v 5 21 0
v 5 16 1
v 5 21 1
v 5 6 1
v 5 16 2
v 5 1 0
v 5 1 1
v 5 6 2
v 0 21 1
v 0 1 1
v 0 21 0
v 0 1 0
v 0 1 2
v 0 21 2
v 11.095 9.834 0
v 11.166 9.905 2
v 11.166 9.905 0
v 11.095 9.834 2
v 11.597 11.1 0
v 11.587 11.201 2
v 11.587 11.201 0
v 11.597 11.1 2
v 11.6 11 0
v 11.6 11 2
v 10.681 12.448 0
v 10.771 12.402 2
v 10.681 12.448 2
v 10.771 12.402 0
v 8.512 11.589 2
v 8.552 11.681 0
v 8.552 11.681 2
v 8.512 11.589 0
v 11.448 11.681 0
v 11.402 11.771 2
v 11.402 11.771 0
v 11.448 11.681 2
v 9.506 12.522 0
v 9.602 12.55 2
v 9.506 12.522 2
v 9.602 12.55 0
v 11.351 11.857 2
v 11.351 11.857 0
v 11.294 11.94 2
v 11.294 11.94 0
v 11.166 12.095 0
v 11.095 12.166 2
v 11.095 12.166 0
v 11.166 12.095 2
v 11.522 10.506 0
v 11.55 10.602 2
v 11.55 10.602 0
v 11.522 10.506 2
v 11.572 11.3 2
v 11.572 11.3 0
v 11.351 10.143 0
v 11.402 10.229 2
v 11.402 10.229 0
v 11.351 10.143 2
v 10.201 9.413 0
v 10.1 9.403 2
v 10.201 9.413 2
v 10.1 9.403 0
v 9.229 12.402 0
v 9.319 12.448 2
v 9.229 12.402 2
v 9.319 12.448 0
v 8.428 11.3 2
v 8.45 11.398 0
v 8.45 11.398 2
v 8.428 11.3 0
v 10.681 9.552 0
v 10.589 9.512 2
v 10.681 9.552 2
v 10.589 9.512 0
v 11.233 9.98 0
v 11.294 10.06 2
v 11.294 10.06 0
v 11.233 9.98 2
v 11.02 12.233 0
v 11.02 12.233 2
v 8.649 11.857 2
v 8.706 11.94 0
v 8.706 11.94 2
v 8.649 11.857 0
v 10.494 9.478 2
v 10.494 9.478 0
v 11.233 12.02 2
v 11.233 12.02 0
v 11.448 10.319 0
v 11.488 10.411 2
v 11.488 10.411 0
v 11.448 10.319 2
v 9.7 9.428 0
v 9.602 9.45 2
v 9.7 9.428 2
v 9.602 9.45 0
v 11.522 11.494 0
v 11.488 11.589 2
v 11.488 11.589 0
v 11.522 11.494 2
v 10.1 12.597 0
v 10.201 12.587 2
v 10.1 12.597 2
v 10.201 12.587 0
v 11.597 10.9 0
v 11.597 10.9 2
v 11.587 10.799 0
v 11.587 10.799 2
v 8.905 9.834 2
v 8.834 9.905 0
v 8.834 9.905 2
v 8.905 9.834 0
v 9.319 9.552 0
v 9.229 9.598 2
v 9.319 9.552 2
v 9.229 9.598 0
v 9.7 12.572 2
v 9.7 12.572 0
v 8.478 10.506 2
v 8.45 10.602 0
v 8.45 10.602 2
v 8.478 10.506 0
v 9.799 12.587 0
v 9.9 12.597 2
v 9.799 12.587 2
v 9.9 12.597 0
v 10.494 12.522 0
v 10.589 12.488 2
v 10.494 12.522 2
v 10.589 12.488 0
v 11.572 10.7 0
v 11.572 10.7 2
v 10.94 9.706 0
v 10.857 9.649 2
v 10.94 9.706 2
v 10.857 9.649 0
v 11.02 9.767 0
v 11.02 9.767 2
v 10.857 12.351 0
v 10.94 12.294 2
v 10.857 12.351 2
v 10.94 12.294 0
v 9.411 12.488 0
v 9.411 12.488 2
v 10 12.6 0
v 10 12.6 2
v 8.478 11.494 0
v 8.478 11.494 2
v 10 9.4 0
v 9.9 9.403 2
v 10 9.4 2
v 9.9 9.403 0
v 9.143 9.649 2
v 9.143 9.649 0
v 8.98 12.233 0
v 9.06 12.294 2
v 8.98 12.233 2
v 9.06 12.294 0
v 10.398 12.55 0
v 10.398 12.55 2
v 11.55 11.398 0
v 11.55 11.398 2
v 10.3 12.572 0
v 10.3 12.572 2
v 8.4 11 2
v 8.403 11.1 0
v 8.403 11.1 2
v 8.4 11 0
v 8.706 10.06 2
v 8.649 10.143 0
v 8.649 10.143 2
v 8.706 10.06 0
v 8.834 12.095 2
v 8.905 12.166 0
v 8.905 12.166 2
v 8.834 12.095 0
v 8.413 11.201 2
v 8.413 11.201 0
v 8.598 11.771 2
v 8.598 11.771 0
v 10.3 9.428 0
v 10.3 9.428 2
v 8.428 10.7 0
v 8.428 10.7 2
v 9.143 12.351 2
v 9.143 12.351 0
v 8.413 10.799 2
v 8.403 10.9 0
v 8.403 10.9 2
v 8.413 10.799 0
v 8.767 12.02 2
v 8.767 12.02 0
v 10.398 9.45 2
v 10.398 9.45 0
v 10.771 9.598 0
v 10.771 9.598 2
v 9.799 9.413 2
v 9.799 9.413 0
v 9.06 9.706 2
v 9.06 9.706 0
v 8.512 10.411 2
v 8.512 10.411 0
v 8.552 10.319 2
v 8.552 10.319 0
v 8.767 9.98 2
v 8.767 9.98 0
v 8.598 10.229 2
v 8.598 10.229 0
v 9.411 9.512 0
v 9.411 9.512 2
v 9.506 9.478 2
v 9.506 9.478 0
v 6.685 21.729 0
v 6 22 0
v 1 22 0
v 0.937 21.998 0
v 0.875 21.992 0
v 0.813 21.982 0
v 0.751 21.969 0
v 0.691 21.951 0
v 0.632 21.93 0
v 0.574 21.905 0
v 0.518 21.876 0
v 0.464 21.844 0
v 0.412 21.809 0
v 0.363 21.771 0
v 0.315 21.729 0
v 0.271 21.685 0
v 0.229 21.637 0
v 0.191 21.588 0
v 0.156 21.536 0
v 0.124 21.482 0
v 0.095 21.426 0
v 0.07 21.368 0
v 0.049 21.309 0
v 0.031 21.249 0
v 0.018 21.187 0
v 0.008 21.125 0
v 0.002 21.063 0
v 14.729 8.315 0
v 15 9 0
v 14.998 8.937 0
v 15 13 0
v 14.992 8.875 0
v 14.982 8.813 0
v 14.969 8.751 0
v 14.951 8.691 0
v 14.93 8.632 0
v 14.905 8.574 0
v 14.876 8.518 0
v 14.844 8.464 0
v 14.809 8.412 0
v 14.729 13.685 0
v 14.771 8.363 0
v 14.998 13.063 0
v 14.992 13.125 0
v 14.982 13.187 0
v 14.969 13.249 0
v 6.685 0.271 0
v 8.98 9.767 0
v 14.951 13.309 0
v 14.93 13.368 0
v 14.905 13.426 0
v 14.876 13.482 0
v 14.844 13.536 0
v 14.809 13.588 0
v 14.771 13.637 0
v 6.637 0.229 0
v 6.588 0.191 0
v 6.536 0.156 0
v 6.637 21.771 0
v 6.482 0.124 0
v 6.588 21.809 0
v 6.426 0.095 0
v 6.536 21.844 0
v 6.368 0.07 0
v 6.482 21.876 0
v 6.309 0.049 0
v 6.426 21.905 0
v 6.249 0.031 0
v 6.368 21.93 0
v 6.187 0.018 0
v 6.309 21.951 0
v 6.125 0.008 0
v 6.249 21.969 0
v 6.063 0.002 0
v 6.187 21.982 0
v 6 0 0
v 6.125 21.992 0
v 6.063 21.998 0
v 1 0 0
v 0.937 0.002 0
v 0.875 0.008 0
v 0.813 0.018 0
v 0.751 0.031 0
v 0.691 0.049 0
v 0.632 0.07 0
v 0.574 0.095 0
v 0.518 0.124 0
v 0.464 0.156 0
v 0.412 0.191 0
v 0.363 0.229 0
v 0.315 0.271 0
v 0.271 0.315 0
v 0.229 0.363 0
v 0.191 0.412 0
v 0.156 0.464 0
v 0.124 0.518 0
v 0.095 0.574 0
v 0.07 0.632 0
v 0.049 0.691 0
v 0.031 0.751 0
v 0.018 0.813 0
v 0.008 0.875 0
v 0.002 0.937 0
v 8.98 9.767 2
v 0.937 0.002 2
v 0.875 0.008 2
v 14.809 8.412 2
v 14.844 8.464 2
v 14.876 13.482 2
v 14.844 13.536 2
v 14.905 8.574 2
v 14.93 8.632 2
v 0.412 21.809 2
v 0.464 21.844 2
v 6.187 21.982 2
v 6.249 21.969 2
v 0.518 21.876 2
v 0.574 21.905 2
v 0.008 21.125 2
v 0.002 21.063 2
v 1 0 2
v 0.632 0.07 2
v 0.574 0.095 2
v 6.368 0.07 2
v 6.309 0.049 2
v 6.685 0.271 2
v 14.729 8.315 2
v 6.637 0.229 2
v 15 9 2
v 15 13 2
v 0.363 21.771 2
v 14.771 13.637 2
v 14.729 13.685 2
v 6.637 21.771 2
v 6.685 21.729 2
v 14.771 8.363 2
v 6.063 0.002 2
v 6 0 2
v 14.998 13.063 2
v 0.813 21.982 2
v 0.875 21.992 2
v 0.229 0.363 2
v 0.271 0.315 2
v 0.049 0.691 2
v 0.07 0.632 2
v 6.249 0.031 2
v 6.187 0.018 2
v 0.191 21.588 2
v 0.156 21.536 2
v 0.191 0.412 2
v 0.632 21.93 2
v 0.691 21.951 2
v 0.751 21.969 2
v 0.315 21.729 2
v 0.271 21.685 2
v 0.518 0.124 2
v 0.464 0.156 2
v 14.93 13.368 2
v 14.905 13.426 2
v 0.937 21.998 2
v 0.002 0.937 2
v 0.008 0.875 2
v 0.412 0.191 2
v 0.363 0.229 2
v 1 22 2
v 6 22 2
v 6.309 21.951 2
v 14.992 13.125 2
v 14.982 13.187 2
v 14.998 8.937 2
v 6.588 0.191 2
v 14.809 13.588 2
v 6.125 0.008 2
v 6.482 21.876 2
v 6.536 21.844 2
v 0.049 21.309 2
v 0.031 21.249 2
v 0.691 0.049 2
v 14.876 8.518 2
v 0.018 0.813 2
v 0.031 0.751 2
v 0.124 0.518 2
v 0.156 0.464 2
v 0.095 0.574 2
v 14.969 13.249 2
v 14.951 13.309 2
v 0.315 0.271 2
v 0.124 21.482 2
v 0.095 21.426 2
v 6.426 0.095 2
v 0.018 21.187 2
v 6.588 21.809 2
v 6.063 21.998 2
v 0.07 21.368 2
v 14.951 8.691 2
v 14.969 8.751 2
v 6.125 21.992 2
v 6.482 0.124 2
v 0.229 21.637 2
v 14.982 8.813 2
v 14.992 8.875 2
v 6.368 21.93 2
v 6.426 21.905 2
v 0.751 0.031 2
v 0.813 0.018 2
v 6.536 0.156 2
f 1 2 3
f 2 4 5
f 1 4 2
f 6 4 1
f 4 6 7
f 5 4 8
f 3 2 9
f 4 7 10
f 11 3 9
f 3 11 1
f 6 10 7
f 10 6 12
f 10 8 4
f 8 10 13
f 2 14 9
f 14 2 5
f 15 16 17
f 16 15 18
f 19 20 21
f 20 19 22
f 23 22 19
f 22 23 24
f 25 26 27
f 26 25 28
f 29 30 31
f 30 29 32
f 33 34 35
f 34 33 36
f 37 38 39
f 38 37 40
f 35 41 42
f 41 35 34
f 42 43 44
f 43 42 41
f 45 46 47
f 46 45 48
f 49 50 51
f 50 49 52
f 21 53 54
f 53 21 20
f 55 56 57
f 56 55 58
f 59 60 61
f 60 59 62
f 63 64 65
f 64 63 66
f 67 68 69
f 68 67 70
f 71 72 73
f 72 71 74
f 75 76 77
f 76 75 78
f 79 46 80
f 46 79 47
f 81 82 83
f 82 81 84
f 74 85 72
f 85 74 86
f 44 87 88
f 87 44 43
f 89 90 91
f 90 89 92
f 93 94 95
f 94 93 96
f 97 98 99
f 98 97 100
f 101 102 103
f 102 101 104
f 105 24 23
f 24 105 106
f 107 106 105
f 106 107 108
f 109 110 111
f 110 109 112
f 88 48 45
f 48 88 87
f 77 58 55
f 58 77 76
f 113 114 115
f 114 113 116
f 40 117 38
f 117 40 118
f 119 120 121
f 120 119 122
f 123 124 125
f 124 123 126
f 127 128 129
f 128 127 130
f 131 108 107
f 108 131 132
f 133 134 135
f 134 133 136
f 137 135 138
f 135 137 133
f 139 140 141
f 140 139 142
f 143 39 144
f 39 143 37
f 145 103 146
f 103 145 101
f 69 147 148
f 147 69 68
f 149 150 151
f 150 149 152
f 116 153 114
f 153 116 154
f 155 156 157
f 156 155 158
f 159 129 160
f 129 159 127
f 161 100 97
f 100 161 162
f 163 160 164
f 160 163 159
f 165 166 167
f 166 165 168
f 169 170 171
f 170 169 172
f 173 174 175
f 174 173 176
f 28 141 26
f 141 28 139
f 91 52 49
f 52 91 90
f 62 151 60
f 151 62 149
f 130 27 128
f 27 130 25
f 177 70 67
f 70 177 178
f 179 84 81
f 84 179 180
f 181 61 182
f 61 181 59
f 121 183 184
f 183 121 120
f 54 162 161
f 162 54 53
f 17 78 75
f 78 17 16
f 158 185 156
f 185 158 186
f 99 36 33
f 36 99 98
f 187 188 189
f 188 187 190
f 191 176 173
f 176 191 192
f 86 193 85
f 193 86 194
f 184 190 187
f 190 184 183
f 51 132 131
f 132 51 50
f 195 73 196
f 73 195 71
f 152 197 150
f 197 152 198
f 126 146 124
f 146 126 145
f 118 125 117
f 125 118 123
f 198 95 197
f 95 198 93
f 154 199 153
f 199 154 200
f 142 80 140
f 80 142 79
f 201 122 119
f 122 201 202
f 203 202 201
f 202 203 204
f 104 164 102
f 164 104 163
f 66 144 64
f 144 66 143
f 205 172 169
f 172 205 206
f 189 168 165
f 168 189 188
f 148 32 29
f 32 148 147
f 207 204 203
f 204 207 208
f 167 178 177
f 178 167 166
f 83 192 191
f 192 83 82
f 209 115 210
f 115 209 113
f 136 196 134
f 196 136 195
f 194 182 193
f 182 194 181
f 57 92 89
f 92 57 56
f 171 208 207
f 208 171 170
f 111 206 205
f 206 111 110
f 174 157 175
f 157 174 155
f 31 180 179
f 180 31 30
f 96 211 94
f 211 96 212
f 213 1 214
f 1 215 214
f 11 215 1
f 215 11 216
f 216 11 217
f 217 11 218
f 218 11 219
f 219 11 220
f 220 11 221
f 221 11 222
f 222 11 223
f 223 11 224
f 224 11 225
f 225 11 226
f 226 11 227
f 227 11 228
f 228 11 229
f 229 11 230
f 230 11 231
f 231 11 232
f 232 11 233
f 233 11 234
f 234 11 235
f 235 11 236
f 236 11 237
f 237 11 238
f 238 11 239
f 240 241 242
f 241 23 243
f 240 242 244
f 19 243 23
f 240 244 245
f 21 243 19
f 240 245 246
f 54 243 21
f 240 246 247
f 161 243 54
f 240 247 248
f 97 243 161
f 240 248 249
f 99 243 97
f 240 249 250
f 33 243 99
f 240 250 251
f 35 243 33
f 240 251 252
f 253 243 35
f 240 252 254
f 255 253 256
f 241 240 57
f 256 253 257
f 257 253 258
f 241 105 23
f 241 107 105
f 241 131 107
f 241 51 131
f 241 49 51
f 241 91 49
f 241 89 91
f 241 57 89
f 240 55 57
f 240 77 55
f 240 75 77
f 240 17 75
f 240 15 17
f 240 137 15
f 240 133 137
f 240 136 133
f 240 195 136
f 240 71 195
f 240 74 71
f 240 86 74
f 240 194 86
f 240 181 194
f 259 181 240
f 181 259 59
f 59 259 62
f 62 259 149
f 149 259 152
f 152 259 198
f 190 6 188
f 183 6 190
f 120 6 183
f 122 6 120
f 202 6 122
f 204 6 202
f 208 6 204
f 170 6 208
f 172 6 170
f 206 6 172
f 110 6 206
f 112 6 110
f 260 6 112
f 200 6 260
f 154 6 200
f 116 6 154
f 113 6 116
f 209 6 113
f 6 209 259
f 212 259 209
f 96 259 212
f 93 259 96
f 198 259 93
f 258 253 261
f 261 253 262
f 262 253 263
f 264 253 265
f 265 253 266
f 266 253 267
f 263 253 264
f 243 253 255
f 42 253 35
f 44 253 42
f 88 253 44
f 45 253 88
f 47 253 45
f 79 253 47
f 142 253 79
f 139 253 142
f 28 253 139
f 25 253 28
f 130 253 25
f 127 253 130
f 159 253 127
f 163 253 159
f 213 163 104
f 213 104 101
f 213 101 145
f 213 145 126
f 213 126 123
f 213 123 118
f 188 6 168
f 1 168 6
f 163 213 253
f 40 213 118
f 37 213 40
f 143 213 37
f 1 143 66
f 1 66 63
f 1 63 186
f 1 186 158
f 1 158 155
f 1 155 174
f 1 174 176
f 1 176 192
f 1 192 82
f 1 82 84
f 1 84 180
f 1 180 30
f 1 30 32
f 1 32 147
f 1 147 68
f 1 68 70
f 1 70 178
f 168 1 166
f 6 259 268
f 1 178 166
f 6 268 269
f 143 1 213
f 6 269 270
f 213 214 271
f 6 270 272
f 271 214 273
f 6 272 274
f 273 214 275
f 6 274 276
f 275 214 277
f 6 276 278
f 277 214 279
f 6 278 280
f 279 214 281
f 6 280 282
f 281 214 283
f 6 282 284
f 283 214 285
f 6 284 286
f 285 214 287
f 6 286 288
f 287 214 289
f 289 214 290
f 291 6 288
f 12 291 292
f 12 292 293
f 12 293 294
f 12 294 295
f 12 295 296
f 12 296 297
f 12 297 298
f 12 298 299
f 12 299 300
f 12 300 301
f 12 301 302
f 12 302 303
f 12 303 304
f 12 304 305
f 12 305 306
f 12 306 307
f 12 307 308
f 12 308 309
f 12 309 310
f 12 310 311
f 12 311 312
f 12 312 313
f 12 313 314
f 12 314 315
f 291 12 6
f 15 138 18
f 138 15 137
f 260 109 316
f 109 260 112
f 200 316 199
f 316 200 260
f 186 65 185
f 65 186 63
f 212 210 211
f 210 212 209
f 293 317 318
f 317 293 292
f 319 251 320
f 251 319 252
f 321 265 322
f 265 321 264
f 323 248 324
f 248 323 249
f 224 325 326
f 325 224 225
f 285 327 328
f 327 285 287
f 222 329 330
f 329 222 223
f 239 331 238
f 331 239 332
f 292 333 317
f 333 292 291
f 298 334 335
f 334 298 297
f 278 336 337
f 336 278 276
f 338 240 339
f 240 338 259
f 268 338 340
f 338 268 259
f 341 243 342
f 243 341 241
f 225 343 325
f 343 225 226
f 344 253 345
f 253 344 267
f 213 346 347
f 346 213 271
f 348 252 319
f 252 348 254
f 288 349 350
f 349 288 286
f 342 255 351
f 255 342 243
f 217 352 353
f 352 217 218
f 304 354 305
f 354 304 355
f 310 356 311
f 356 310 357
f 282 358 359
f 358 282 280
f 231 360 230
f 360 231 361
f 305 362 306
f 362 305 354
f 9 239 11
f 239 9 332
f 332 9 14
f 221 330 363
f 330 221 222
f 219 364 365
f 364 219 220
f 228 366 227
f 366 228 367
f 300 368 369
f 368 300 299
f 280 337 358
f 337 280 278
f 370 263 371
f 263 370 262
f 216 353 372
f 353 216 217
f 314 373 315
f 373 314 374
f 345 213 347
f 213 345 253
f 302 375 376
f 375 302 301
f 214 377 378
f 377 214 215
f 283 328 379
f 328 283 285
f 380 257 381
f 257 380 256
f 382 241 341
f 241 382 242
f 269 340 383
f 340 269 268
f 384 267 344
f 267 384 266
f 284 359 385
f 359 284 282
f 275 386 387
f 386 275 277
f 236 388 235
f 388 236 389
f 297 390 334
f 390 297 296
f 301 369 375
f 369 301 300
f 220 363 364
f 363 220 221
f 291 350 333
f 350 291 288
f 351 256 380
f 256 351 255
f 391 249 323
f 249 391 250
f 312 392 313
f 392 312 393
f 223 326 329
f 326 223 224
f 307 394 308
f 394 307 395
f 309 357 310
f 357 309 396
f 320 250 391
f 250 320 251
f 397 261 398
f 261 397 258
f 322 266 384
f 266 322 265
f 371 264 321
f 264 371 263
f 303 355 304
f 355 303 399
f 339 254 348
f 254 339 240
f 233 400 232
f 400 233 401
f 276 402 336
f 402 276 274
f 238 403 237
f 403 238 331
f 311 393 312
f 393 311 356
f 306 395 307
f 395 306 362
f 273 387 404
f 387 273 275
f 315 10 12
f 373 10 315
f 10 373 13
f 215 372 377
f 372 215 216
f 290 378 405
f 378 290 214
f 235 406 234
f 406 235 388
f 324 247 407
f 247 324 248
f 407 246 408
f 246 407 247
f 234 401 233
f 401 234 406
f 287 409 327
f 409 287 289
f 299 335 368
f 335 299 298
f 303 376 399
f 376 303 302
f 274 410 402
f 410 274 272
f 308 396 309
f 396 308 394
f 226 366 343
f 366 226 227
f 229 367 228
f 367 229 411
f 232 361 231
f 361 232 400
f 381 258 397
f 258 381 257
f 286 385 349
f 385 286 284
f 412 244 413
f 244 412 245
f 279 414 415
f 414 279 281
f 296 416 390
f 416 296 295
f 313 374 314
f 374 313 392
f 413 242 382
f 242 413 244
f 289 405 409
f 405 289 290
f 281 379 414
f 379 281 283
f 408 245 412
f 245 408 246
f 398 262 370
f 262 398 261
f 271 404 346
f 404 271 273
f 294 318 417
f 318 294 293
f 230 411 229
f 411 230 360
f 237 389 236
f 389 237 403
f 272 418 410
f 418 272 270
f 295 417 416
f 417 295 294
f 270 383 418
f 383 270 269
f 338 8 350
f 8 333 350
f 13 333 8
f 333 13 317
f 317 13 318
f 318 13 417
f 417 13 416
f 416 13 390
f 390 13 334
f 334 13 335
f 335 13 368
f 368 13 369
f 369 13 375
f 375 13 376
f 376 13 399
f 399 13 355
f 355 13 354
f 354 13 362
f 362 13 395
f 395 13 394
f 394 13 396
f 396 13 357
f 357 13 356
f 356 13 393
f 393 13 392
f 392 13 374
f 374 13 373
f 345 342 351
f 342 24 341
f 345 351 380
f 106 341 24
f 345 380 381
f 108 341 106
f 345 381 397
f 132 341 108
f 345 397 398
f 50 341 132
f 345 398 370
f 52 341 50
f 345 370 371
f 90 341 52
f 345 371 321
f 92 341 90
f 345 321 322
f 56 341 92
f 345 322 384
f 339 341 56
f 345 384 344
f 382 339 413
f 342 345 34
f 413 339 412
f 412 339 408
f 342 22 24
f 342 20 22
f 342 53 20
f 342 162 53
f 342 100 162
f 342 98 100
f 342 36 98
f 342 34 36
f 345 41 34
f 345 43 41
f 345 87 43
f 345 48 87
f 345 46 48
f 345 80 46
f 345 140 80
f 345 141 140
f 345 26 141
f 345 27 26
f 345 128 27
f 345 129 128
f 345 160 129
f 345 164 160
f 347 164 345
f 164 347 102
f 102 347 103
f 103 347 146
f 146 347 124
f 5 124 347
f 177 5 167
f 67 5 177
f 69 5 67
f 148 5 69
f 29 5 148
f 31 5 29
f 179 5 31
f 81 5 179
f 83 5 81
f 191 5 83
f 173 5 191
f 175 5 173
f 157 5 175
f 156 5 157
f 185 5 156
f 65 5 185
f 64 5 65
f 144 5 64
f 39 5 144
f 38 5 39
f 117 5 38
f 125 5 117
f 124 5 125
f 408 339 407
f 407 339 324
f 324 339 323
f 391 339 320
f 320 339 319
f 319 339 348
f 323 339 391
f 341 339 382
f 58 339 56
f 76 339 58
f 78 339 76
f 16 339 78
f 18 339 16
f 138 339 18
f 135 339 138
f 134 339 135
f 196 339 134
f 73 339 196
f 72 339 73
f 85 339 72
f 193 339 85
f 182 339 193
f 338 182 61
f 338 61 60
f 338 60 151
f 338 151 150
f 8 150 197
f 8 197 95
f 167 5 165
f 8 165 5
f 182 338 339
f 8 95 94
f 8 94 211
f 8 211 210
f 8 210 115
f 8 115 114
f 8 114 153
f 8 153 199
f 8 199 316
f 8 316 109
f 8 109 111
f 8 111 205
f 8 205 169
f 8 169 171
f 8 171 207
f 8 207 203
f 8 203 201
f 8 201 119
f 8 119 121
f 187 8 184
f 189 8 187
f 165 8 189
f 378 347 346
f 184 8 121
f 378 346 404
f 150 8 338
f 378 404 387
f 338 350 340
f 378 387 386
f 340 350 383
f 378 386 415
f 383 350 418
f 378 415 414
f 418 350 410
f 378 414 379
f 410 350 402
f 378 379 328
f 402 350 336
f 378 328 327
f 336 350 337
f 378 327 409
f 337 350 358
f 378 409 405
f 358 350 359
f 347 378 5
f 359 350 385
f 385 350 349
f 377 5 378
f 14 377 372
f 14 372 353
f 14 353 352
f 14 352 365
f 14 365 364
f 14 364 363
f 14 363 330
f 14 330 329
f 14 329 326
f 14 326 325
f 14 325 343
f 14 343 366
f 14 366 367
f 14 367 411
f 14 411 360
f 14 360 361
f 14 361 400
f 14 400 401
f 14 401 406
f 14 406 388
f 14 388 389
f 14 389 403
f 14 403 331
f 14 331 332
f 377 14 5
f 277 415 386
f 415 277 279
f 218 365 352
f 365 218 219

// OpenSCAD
$fn = 100;

/* for rendering */
extra = 0.1;


clampWall = 1;            // 1mm wall on the sides
clampTopThickness = 1;
serialPlateWidth = 20;    // width of extrusion
serialPlateThickness = 1;

clampPlateX = 5;        // 5mm holding the plate
clampPlateY = 5;        // 10mm free clearance in the middle of the side of the plate (only valid for TYPE2)
clampPlateYinner = 10;  // 10mm free clearance in the middle of the side of the plate
clampX = 10;            // 10mm for rest and screw

screwHoleDia = 3.2;     //M3 screw with 0.2mm extra clearance
minkowskiCylinderR = 1; // roundness

module ldoSerialPlate(type = "DEBUG")
{
  difference() {

    if(type == "TYPE1") {
      /* rectangular clamp */
      translate([minkowskiCylinderR,minkowskiCylinderR,0])
      minkowski() {
        cube([clampPlateX+clampX-minkowskiCylinderR*2,      // x width
          serialPlateWidth+clampWall*2-minkowskiCylinderR*2,
          clampTopThickness+serialPlateThickness]);
        cylinder(r=minkowskiCylinderR, h=0.00000001, center=true);
      }
    } else if (type == "TYPE2") {
      /* edgy type */
      minkowski(){
        translate([minkowskiCylinderR,minkowskiCylinderR,0])
        hull()
        {
          cube([clampPlateX+clampWall*2-minkowskiCylinderR*2,
            serialPlateWidth+clampWall*2-minkowskiCylinderR*2,
            clampTopThickness+serialPlateThickness]);
          translate([clampPlateX+clampX-minkowskiCylinderR*2-extra,(serialPlateWidth-clampPlateY)/2+clampWall/2,0])
            cube([extra,clampPlateY+1-minkowskiCylinderR*2,clampTopThickness+serialPlateThickness]);
        }
        cylinder(r=minkowskiCylinderR, h=0.00000001, center=true);
      }
    }

    if (1) // for debugging
    {
      translate([0,clampWall,-extra])
      cube([clampPlateX,serialPlateWidth,serialPlateThickness+extra]);

      /* top cutout for serial plate (trapezial shape) */
      translate([-extra,clampWall,clampWall])
      hull()
      {
        cube([0.1,serialPlateWidth,serialPlateThickness]);
        translate([clampPlateX,(serialPlateWidth-clampPlateYinner)/2,0]) cube([0.1,clampPlateYinner,1.1]);
      }

      /* screw hole */
      translate([clampPlateX+(clampX/2),(serialPlateWidth+minkowskiCylinderR*2)/2,0])
      cylinder(r=screwHoleDia/2,h=serialPlateThickness+clampTopThickness+extra);
    }
  }
}


ldoSerialPlate("TYPE2");

/* translate([30,0,0])
ldoSerialPlate("TYPE1"); */
